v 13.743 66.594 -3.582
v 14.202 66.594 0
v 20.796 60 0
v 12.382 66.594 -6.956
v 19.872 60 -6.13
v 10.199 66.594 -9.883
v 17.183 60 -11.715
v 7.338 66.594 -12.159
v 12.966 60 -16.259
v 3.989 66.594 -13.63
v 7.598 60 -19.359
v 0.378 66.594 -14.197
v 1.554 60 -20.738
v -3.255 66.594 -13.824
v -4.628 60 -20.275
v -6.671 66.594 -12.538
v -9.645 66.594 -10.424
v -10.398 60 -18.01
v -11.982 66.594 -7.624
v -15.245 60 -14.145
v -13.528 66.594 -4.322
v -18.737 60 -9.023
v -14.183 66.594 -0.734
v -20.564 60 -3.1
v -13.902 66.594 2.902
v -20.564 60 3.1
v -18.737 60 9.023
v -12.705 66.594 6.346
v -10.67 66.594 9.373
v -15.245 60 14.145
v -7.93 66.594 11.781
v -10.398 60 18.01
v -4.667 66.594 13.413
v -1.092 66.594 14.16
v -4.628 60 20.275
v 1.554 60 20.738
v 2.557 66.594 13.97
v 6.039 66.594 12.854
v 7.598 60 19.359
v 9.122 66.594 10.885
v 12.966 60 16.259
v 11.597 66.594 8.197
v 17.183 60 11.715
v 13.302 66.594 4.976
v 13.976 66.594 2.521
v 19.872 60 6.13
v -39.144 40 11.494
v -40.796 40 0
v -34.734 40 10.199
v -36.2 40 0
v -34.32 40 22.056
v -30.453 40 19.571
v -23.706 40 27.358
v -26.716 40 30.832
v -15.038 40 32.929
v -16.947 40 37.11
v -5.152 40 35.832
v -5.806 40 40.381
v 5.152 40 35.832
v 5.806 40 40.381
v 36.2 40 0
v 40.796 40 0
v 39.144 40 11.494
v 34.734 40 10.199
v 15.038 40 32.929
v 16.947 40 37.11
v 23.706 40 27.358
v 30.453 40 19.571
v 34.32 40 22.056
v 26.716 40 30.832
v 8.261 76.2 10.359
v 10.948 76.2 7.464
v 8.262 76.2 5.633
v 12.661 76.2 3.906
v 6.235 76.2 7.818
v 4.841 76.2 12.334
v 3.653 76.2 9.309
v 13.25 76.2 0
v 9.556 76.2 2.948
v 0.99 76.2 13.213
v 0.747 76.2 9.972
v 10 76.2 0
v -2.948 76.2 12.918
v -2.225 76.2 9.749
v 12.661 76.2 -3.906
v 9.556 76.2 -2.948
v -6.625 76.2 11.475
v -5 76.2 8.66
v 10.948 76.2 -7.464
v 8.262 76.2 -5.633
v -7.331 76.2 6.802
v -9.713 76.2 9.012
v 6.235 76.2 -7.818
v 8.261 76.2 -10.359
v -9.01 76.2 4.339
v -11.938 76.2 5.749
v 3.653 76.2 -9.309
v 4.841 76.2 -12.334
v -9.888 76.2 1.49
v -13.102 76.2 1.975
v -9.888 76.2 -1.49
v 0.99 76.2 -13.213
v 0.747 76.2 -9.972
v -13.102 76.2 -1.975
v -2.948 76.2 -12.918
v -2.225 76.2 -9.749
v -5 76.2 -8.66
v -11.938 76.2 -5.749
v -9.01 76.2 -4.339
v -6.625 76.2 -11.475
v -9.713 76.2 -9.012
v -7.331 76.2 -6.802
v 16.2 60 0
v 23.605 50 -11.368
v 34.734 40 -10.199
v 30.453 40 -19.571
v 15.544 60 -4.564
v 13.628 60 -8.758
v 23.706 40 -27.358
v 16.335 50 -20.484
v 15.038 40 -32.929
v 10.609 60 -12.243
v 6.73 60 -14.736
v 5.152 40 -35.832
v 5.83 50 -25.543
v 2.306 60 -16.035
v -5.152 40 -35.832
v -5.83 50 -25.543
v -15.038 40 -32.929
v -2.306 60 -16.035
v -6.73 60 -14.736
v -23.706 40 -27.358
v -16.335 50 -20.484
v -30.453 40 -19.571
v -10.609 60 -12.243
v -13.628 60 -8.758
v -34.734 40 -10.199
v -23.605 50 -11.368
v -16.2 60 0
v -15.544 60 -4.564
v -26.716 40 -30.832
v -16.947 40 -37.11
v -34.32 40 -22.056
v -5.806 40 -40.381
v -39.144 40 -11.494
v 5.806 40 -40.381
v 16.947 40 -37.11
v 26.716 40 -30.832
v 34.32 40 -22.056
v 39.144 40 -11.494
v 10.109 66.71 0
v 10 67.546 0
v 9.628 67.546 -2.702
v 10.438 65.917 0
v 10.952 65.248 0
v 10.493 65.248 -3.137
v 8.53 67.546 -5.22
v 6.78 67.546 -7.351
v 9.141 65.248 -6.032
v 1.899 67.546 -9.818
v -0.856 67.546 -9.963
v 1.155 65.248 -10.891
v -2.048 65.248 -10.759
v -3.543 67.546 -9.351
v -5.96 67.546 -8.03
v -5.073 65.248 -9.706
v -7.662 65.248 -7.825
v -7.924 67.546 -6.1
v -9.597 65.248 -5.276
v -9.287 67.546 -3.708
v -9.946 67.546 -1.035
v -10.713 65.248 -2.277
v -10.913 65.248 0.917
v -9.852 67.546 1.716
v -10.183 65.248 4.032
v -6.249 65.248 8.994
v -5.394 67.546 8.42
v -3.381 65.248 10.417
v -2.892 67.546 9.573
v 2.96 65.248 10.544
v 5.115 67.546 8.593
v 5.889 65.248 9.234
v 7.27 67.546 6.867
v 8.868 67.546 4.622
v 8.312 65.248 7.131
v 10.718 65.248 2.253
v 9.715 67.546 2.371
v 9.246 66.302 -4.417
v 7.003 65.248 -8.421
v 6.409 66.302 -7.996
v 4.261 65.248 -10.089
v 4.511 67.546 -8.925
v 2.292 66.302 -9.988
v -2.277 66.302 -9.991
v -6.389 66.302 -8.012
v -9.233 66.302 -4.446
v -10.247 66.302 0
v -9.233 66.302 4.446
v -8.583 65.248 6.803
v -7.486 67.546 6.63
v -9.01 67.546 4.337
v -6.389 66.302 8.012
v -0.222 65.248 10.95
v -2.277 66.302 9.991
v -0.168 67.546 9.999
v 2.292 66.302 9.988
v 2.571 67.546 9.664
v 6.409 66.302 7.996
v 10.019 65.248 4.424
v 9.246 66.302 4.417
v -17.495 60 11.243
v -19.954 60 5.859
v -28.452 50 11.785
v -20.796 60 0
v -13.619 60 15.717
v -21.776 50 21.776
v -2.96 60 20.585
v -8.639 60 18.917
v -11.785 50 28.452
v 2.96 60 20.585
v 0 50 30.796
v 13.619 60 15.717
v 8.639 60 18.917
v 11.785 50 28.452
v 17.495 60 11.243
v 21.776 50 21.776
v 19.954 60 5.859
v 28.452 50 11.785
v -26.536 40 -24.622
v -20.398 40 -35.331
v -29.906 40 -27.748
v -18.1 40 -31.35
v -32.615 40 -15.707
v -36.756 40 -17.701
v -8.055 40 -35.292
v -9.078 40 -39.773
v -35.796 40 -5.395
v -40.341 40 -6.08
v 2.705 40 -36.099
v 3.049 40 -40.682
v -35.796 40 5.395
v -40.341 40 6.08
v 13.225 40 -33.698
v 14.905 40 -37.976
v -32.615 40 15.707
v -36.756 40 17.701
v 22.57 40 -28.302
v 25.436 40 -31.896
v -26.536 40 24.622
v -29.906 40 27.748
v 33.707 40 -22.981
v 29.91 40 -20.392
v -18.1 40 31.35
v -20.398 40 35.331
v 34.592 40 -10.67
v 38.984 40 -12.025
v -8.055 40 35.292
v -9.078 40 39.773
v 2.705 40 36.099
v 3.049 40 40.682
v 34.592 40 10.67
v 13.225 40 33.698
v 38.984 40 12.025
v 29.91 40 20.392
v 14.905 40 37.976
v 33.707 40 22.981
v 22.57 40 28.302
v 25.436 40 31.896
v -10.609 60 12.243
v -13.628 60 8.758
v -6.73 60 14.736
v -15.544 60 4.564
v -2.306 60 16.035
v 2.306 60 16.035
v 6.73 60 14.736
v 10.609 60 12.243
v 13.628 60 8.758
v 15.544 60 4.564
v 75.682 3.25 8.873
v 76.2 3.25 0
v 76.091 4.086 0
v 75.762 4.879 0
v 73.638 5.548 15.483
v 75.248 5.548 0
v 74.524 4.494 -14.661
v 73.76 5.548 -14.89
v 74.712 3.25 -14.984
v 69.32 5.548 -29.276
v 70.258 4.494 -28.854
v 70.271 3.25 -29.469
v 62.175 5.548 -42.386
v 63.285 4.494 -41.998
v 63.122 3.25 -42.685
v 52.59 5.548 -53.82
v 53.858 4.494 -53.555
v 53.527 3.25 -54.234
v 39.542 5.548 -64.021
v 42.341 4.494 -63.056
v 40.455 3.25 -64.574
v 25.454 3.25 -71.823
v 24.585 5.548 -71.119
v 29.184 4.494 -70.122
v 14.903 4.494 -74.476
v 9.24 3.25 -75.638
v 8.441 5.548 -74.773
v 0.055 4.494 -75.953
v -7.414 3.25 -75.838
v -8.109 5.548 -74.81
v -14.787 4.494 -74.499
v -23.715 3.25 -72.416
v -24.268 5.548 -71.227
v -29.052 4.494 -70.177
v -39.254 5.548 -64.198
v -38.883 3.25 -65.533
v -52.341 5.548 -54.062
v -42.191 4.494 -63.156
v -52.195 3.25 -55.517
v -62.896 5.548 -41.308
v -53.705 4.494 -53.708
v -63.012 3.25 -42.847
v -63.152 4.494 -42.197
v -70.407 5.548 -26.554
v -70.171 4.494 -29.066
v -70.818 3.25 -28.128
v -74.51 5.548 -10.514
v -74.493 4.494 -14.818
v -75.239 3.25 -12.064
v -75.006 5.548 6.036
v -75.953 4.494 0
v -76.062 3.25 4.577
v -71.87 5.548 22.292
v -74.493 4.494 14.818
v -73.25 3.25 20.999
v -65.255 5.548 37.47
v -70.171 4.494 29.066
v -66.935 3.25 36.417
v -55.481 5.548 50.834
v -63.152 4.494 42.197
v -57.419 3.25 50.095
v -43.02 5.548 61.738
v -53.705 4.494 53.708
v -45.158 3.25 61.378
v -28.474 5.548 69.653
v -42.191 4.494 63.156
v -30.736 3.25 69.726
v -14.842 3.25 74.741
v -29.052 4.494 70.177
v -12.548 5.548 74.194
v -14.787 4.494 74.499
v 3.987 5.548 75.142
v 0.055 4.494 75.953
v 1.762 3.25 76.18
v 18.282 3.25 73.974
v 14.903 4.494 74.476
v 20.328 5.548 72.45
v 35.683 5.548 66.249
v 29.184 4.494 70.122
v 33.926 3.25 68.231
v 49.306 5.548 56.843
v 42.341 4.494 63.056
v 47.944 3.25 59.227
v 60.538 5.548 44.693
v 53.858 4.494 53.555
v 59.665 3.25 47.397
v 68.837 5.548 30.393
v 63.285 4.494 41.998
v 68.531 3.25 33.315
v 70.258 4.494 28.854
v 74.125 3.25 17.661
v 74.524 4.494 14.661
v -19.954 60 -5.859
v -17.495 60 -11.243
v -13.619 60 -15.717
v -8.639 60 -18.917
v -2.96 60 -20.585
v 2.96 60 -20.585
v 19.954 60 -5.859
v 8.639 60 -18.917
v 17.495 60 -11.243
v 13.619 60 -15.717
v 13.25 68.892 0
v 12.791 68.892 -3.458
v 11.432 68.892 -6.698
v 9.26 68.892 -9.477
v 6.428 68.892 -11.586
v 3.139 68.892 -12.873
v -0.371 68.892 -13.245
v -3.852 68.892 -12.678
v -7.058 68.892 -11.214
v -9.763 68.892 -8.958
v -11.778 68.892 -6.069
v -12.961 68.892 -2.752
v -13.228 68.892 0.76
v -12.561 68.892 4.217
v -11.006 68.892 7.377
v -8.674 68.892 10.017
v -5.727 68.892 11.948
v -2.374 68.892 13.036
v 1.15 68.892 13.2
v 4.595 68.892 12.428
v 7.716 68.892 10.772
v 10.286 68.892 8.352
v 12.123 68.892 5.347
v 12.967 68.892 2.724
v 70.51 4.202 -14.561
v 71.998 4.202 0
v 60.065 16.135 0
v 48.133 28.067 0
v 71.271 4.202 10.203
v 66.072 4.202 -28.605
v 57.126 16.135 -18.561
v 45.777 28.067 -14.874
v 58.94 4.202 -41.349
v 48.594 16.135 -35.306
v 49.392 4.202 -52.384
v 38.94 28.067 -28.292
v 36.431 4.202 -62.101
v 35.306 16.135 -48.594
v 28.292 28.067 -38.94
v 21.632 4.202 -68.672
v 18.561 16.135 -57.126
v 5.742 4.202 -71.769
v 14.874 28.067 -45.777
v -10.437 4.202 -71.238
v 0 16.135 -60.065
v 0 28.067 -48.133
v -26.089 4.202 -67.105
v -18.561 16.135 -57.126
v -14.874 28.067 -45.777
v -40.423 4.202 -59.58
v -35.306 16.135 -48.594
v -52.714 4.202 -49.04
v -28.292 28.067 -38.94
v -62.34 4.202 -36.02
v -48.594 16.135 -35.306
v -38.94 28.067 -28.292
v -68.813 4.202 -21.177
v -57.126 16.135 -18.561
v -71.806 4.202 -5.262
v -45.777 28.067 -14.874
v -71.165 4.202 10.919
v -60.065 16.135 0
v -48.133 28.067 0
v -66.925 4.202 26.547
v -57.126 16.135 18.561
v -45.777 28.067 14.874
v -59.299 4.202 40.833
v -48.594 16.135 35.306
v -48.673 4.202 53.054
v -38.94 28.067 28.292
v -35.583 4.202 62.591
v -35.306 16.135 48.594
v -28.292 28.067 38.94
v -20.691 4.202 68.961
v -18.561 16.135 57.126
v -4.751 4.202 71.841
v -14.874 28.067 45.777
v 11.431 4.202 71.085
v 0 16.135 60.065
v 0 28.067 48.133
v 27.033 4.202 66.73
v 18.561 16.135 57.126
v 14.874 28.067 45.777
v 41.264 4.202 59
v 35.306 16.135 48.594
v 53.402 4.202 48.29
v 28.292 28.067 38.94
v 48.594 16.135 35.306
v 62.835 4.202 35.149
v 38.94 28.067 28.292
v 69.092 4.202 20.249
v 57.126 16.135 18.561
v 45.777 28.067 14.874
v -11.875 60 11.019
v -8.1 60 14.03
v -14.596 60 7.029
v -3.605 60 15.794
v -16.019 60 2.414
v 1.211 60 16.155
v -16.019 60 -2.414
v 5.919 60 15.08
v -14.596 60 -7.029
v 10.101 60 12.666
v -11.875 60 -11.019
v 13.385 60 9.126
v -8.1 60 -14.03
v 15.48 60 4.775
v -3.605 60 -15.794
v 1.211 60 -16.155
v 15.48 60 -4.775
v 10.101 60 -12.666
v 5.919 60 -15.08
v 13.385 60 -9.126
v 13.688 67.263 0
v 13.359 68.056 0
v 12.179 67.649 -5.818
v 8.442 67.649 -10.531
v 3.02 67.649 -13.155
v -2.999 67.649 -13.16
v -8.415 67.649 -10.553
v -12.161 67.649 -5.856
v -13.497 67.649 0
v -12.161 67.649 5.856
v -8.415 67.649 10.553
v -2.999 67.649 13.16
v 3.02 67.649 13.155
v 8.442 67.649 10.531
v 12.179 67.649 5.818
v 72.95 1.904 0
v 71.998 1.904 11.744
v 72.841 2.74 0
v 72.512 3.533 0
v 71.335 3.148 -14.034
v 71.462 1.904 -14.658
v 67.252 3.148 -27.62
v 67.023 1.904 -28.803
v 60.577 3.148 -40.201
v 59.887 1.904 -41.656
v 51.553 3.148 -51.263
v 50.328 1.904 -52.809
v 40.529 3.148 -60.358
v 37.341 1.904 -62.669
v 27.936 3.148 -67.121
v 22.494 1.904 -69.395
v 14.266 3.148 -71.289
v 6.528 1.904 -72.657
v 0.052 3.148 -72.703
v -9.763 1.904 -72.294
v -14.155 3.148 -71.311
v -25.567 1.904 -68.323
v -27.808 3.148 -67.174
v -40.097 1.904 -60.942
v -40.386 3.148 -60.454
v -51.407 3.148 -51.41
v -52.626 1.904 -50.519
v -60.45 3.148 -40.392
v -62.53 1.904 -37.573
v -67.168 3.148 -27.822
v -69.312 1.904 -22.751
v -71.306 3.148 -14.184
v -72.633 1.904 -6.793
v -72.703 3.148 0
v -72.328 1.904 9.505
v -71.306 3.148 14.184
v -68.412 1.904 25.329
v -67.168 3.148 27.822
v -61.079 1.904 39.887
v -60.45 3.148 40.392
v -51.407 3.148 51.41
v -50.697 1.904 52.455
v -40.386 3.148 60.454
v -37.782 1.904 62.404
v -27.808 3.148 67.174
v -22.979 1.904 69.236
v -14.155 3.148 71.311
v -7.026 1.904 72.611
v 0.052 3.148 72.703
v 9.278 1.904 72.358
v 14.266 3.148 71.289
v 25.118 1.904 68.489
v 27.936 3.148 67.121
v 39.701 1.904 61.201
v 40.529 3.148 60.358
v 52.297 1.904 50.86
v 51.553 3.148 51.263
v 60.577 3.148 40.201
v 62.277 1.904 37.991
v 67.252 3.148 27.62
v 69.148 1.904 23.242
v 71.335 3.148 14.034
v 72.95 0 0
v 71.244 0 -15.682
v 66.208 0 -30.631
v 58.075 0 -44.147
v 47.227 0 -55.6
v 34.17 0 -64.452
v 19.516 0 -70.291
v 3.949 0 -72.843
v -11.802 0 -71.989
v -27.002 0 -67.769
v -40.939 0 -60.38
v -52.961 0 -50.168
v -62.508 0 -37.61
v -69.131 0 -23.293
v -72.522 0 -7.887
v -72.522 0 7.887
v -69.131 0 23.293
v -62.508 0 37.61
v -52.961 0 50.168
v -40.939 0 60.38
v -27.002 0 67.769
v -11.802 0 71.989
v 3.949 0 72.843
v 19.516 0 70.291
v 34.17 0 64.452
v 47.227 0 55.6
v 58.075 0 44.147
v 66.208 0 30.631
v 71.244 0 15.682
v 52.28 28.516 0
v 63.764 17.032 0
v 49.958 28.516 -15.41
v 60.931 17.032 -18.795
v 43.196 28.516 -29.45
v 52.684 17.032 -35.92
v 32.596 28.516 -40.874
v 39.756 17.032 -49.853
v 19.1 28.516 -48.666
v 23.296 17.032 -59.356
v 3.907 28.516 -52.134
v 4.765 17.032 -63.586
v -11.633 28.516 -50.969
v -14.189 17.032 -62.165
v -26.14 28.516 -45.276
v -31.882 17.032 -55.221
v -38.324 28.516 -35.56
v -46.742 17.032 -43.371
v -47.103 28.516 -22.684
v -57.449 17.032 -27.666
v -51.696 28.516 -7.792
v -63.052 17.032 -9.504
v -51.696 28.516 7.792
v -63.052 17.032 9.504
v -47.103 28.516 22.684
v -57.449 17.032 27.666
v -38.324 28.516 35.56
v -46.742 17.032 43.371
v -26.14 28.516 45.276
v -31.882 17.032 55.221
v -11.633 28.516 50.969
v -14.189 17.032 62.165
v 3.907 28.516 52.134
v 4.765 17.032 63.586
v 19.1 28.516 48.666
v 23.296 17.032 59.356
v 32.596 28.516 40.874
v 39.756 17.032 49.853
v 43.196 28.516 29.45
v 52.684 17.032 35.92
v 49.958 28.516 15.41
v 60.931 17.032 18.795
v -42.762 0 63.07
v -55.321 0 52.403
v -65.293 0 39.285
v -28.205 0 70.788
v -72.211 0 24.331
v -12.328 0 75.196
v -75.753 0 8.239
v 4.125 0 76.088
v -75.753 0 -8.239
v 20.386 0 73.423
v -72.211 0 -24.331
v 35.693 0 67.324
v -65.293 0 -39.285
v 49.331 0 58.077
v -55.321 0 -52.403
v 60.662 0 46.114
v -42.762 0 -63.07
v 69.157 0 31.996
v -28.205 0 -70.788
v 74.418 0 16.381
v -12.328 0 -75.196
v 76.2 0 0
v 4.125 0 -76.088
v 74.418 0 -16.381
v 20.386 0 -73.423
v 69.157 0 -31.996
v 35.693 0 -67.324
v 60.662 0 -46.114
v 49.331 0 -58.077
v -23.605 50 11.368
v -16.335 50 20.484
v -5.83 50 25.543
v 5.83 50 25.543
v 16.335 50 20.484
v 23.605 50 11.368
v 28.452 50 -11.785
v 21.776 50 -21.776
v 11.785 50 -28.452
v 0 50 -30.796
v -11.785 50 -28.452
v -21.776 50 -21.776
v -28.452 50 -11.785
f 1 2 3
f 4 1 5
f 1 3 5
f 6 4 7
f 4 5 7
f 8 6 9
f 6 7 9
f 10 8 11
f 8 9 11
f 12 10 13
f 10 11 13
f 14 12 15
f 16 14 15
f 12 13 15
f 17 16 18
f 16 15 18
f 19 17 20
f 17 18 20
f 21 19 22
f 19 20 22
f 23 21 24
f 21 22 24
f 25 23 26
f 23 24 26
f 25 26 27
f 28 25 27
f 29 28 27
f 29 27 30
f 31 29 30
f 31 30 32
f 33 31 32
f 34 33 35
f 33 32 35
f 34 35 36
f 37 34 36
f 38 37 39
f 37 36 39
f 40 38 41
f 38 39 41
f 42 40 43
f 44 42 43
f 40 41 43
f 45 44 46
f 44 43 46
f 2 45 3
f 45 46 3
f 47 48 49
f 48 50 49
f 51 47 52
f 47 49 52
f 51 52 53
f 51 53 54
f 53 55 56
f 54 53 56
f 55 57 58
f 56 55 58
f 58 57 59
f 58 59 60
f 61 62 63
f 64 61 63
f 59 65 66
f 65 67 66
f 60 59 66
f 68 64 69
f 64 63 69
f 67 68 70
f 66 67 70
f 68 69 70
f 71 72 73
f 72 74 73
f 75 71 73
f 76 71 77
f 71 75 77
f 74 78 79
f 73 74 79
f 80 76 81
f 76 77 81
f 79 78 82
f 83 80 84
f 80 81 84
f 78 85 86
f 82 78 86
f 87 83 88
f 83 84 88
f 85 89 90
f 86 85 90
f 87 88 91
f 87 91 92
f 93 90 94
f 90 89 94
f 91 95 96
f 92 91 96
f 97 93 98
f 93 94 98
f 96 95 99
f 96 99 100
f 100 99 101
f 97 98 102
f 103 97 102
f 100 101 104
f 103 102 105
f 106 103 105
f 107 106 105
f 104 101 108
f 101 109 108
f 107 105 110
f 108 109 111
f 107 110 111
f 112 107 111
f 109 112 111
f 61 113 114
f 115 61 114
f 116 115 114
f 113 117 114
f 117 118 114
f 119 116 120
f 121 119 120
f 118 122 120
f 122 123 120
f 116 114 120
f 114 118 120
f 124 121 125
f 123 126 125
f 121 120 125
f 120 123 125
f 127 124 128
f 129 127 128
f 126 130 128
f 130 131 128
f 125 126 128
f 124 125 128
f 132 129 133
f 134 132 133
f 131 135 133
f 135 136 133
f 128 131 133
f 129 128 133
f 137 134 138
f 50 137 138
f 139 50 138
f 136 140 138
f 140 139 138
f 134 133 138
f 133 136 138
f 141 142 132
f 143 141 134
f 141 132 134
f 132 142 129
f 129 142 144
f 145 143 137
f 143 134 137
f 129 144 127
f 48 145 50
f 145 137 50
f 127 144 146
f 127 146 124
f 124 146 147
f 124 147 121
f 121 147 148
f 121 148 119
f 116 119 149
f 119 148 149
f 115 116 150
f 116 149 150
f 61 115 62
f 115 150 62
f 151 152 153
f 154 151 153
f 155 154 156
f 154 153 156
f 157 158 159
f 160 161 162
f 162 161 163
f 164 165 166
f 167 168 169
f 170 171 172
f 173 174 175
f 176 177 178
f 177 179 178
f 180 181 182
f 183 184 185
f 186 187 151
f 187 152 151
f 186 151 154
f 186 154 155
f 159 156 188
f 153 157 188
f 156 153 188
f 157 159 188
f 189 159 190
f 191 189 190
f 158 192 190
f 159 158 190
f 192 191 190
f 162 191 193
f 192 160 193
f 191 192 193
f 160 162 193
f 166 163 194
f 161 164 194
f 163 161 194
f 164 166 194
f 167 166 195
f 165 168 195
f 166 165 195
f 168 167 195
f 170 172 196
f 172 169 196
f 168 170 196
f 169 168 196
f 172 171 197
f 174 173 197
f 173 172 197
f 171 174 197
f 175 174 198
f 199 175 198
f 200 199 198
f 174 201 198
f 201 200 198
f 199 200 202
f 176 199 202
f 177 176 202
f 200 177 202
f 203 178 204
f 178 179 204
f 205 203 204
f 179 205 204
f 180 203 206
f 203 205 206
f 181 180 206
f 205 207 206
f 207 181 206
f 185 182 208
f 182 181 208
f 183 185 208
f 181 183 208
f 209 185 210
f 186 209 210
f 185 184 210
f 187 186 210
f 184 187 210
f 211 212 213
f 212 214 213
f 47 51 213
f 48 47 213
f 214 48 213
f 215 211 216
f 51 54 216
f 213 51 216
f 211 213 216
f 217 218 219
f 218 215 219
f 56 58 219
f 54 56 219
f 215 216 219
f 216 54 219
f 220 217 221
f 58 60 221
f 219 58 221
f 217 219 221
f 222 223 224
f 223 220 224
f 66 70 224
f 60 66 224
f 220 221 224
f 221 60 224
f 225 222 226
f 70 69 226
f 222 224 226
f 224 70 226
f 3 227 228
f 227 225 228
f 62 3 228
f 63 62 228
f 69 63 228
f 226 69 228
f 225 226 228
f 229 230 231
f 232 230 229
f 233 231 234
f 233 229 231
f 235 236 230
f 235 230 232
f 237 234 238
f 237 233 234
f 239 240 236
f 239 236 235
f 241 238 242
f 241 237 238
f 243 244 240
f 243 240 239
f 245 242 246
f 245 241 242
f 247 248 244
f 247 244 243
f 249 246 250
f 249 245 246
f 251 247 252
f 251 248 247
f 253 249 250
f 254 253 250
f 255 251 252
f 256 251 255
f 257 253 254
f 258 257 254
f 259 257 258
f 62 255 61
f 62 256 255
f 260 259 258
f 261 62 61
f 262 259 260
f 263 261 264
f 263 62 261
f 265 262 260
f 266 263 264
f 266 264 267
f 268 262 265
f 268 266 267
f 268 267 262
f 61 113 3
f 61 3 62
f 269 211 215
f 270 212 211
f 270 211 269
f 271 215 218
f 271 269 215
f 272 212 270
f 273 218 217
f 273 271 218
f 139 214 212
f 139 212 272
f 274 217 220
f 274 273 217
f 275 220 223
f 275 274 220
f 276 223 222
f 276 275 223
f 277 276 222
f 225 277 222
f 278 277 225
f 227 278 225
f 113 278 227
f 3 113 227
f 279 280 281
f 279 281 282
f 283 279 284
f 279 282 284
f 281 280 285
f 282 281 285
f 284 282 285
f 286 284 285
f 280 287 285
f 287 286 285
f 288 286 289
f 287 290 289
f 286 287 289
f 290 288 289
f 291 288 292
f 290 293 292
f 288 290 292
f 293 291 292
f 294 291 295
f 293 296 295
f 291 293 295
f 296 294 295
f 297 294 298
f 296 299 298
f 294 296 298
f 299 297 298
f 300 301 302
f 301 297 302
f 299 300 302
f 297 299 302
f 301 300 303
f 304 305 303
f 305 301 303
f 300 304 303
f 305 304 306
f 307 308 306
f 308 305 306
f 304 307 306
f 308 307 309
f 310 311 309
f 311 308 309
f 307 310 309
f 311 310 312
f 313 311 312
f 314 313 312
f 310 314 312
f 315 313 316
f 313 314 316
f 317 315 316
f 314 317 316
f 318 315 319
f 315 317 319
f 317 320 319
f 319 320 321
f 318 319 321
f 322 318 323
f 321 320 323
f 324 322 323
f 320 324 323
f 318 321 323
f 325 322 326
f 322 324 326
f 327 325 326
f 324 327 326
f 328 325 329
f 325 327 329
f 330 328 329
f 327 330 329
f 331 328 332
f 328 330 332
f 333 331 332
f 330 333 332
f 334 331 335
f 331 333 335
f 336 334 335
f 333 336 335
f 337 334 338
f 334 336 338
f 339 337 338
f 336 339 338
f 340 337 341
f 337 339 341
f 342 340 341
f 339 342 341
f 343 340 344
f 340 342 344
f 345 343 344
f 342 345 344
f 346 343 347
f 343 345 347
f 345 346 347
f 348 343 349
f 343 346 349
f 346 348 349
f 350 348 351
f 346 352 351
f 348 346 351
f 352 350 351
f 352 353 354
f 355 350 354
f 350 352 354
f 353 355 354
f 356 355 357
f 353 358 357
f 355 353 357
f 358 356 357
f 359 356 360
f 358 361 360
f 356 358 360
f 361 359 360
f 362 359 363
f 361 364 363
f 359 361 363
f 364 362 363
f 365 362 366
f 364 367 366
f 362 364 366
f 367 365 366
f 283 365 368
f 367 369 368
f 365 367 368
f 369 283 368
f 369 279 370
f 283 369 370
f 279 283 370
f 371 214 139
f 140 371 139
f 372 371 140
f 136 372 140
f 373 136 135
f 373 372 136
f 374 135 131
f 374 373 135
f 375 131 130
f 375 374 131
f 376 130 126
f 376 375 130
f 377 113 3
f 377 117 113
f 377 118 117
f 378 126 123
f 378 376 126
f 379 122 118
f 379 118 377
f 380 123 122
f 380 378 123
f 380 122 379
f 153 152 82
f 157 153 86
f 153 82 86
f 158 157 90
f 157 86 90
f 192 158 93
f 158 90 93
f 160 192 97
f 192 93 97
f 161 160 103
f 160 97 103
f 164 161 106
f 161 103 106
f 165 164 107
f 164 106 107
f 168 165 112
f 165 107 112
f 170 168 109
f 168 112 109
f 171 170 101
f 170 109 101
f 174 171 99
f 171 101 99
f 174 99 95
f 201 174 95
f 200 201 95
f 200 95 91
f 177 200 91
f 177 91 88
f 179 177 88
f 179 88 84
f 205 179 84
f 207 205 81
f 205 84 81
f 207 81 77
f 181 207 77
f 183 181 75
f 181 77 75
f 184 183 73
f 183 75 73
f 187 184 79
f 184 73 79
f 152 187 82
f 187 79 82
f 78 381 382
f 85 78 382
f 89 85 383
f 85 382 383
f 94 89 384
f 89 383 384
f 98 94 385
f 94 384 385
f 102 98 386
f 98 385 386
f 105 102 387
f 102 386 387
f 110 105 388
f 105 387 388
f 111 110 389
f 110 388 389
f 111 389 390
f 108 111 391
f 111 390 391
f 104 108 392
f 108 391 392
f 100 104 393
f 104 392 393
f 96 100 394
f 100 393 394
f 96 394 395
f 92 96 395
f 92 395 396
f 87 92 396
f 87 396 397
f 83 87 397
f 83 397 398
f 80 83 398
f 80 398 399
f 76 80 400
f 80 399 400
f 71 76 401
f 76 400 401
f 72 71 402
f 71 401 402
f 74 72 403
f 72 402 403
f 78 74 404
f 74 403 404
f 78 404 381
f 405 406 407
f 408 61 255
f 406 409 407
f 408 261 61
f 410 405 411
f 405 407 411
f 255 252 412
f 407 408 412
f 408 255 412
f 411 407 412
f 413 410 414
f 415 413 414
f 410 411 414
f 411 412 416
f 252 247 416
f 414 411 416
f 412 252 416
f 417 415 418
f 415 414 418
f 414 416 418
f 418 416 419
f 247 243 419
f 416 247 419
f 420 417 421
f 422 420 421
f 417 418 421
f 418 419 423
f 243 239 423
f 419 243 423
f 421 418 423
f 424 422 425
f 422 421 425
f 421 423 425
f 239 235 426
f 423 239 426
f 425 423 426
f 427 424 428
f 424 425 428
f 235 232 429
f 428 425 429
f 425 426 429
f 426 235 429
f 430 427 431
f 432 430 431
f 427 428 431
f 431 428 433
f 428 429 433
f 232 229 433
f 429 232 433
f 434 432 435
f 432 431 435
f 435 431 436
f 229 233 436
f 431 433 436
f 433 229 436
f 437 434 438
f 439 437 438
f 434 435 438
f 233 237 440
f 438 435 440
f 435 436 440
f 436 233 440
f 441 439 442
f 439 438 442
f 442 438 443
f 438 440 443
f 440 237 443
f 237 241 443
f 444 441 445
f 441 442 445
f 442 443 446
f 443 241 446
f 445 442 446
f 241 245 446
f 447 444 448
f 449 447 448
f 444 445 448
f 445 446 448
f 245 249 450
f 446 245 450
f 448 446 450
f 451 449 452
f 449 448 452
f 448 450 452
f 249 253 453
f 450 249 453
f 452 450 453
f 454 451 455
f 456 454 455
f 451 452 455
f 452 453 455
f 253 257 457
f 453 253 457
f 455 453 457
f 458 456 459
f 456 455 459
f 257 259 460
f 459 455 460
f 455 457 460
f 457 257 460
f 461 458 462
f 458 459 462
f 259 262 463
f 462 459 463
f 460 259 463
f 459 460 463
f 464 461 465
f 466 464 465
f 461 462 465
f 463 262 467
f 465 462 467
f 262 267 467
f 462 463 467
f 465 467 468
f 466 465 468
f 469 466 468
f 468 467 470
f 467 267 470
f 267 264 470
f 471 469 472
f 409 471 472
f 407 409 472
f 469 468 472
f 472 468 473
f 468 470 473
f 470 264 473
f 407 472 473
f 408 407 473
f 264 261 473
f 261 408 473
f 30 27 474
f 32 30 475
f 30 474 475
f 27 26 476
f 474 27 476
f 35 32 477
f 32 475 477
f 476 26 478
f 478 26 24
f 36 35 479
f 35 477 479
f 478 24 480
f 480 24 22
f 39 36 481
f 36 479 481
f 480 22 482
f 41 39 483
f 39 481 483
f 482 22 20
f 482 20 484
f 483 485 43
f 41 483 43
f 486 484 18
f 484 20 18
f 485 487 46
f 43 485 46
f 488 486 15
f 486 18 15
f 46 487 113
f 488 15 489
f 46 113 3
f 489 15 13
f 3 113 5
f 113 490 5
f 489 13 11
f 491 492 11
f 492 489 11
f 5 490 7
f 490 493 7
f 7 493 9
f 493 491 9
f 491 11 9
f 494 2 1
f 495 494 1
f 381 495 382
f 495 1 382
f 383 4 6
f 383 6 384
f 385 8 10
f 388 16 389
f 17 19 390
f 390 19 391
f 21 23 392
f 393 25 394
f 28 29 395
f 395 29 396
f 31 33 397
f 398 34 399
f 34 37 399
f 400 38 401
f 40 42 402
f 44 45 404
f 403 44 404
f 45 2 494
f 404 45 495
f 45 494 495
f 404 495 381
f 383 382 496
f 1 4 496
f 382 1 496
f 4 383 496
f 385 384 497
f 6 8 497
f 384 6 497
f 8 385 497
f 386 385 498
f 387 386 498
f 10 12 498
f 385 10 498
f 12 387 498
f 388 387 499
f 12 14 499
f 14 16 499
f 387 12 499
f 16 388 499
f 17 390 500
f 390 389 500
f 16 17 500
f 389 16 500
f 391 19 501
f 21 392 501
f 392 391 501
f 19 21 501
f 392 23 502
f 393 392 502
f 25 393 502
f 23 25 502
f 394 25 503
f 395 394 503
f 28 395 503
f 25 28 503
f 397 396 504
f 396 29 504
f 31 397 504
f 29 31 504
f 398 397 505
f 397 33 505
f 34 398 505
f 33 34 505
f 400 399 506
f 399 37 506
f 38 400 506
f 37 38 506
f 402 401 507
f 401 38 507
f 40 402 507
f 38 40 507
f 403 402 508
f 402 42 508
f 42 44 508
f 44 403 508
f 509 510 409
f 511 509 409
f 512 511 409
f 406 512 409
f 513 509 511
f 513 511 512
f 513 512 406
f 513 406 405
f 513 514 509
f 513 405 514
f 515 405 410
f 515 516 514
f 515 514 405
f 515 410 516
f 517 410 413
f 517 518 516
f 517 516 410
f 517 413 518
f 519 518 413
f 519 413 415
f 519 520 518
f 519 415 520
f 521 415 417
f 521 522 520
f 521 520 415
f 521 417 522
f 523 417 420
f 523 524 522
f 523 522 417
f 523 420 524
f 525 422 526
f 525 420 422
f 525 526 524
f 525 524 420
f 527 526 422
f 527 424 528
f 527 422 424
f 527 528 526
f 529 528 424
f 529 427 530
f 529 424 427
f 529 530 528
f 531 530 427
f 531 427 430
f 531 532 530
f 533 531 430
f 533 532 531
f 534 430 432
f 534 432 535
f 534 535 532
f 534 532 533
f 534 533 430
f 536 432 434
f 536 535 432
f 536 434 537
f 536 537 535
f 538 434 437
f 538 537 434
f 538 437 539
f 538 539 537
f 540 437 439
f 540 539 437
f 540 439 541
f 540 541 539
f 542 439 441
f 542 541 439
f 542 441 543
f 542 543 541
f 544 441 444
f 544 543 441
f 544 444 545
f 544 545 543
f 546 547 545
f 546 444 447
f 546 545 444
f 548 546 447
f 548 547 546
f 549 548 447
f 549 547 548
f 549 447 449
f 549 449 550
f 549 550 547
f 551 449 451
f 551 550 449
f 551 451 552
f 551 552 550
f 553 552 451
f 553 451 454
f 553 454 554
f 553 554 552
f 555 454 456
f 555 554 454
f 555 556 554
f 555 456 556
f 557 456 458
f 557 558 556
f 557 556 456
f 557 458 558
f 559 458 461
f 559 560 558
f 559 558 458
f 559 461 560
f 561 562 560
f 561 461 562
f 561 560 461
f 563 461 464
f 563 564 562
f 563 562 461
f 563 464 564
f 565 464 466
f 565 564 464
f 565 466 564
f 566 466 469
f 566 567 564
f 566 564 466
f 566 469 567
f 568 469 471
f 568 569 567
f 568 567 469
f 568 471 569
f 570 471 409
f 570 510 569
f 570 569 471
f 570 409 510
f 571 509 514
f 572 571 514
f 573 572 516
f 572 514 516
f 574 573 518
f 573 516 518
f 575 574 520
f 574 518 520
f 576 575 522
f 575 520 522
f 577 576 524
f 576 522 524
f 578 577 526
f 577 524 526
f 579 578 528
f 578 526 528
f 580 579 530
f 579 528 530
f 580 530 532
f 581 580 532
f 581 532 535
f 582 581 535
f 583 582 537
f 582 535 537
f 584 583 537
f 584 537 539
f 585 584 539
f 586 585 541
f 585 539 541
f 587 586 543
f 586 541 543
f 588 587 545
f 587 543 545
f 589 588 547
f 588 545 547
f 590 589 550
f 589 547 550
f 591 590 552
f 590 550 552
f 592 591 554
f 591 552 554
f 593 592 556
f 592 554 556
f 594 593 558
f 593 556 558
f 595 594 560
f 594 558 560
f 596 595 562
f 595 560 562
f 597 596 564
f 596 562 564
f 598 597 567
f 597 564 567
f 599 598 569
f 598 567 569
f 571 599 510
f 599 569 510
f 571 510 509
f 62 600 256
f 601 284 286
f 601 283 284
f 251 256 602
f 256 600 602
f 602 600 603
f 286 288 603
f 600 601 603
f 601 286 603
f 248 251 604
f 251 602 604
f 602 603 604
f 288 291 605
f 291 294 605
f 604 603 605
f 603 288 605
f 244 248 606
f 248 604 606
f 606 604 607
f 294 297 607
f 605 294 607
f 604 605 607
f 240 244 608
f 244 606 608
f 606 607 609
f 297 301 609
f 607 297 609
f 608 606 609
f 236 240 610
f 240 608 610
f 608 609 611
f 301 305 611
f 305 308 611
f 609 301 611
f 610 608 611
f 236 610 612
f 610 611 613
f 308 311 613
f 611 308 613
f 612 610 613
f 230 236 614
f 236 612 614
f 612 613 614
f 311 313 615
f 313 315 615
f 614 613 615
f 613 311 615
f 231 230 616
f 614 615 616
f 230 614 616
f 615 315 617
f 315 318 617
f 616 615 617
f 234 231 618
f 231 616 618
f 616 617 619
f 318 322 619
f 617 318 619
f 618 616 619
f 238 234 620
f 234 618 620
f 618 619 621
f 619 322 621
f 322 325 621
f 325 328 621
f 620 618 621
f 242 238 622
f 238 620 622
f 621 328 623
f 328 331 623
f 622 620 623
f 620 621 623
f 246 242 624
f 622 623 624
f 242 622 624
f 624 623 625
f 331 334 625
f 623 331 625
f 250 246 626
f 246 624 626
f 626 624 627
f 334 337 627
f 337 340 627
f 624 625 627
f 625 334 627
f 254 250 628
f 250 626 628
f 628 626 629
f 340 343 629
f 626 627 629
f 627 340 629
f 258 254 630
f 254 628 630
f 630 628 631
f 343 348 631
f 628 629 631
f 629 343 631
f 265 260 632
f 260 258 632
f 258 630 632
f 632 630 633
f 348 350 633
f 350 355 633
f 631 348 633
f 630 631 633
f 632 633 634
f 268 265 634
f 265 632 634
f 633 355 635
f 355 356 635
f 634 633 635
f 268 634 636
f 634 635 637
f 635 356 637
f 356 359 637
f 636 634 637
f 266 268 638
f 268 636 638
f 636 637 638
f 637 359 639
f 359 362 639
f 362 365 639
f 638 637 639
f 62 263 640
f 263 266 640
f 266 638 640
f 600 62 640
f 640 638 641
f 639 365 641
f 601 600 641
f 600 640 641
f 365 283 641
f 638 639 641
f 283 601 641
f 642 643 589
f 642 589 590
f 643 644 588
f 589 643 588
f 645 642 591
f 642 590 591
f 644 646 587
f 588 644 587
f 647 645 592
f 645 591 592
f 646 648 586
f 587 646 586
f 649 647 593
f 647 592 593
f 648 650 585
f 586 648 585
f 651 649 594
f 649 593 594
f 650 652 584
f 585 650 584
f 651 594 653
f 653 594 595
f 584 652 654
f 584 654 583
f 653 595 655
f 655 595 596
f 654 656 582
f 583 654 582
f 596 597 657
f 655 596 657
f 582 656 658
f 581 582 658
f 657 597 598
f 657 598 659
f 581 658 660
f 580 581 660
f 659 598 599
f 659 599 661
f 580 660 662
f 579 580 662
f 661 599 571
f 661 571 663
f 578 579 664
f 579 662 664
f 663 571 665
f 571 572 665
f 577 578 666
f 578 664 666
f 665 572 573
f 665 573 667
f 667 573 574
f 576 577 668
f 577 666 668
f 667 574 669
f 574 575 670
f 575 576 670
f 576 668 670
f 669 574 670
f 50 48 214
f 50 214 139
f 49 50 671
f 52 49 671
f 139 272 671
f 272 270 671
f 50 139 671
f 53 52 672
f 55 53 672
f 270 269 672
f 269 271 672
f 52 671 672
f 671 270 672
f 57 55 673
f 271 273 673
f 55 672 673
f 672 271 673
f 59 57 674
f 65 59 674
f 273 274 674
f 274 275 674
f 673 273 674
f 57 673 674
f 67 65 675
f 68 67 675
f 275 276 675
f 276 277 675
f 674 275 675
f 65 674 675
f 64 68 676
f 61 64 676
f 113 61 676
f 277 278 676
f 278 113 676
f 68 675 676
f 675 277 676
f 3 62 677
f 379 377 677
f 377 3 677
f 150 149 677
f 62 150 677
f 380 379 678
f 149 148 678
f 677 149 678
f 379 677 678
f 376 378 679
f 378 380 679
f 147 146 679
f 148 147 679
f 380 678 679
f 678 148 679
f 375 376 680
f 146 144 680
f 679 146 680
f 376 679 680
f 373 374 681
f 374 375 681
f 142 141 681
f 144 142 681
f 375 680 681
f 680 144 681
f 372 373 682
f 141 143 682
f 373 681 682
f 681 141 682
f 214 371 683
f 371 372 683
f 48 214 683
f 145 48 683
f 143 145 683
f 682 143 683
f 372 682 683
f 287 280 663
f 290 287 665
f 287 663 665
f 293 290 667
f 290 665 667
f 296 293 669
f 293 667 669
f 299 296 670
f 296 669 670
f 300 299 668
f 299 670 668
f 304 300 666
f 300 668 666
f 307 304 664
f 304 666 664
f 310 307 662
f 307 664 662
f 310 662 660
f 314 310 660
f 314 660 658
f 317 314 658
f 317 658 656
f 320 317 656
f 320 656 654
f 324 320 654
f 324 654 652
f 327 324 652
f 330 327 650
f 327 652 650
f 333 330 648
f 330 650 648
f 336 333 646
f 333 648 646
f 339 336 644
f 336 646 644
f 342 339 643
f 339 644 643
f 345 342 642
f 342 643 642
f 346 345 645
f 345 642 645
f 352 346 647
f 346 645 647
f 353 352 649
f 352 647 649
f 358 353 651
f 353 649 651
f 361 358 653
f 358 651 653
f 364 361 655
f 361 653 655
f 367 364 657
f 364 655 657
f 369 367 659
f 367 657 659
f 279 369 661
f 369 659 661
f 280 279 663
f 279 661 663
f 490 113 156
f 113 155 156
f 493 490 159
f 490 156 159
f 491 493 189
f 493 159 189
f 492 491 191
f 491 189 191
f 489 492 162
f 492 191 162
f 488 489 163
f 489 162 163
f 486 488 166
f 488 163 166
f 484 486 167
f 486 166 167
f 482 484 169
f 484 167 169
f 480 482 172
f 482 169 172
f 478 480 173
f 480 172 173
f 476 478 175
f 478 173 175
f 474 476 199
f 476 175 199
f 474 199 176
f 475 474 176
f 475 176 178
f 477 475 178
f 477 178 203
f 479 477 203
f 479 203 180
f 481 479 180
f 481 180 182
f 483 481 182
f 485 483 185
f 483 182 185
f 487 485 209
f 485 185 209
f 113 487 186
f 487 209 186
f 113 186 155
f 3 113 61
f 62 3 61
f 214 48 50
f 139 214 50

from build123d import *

# Parameters (mm, degrees)
FILLET1_R = 3.25
FILLET2_R = 3.25
FILLET3_R = 3.25
FILLET4_R = 3.25


# Read off the part's stored shape, not the designer's step: Split2, Split3
with BuildPart() as part:
    # Sketch2 → Revolve1 (revolve)
    with BuildSketch(Plane.XY, mode=Mode.PRIVATE) as revolve1_sk:
        Polygon((-76.2, 4.596194078), (-76.2, 0), (-72.95, 0), (-72.95, 3.25), (-10, 66.2), (-10, 70.796194078), (-10, 76.2), (-13.25, 76.2), (-13.25, 67.546194078), align=None)
    revolve(revolve1_sk.sketch.rotate(Axis((0, 0, 0), (0, 1, 0)), 180), axis=Axis((0, 0, 0), (0, 1, 0)))

    # Fillet1
    fillet1_edges = [part.edges().sort_by_distance(p)[0] for p in [
        (-76.2, 4.596194078, 0),
    ]]
    fillet(fillet1_edges, radius=FILLET1_R)

    # Fillet2
    fillet2_edges = [part.edges().sort_by_distance(p)[0] for p in [
        (-72.95, 3.25, 0),
    ]]
    fillet(fillet2_edges, radius=FILLET2_R)

    # Fillet3
    fillet3_edges = [part.edges().sort_by_distance(p)[0] for p in [
        (-13.25, 67.546194078, 0),
    ]]
    fillet(fillet3_edges, radius=FILLET3_R)

    # Fillet4
    fillet4_edges = [part.edges().sort_by_distance(p)[0] for p in [
        (-10, 66.2, 0),
    ]]
    fillet(fillet4_edges, radius=FILLET4_R)


with BuildPart() as body_2:
    # Split1: the piece on the far side of the plane
    add(part.part)
    split(bisect_by=Plane.ZX.offset(40), keep=Keep.BOTTOM)


with BuildPart() as part_1:
    add(part.part)

    # Split1
    split(bisect_by=Plane.ZX.offset(40), keep=Keep.TOP)


with BuildPart() as body_3:
    # Split2: the piece on the far side of the plane
    add(part_1.part)
    split(bisect_by=Plane(origin=(0, 60, 0), x_dir=(1, 0, 0), z_dir=(0, 1, 0)), keep=Keep.BOTTOM)


with BuildPart() as part_2:
    add(part_1.part)

    # Split2
    split(bisect_by=Plane(origin=(0, 60, 0), x_dir=(1, 0, 0), z_dir=(0, 1, 0)), keep=Keep.TOP)


with BuildPart() as body_4:
    # Split3: the piece on the far side of the plane
    add(body_3.part)
    split(bisect_by=Plane.XY, keep=Keep.BOTTOM)


with BuildPart() as body_3_1:
    add(body_3.part)

    # Split3
    split(bisect_by=Plane.XY, keep=Keep.TOP)


solid = Compound([body_2.part, part_2.part, body_4.part, body_3_1.part])
